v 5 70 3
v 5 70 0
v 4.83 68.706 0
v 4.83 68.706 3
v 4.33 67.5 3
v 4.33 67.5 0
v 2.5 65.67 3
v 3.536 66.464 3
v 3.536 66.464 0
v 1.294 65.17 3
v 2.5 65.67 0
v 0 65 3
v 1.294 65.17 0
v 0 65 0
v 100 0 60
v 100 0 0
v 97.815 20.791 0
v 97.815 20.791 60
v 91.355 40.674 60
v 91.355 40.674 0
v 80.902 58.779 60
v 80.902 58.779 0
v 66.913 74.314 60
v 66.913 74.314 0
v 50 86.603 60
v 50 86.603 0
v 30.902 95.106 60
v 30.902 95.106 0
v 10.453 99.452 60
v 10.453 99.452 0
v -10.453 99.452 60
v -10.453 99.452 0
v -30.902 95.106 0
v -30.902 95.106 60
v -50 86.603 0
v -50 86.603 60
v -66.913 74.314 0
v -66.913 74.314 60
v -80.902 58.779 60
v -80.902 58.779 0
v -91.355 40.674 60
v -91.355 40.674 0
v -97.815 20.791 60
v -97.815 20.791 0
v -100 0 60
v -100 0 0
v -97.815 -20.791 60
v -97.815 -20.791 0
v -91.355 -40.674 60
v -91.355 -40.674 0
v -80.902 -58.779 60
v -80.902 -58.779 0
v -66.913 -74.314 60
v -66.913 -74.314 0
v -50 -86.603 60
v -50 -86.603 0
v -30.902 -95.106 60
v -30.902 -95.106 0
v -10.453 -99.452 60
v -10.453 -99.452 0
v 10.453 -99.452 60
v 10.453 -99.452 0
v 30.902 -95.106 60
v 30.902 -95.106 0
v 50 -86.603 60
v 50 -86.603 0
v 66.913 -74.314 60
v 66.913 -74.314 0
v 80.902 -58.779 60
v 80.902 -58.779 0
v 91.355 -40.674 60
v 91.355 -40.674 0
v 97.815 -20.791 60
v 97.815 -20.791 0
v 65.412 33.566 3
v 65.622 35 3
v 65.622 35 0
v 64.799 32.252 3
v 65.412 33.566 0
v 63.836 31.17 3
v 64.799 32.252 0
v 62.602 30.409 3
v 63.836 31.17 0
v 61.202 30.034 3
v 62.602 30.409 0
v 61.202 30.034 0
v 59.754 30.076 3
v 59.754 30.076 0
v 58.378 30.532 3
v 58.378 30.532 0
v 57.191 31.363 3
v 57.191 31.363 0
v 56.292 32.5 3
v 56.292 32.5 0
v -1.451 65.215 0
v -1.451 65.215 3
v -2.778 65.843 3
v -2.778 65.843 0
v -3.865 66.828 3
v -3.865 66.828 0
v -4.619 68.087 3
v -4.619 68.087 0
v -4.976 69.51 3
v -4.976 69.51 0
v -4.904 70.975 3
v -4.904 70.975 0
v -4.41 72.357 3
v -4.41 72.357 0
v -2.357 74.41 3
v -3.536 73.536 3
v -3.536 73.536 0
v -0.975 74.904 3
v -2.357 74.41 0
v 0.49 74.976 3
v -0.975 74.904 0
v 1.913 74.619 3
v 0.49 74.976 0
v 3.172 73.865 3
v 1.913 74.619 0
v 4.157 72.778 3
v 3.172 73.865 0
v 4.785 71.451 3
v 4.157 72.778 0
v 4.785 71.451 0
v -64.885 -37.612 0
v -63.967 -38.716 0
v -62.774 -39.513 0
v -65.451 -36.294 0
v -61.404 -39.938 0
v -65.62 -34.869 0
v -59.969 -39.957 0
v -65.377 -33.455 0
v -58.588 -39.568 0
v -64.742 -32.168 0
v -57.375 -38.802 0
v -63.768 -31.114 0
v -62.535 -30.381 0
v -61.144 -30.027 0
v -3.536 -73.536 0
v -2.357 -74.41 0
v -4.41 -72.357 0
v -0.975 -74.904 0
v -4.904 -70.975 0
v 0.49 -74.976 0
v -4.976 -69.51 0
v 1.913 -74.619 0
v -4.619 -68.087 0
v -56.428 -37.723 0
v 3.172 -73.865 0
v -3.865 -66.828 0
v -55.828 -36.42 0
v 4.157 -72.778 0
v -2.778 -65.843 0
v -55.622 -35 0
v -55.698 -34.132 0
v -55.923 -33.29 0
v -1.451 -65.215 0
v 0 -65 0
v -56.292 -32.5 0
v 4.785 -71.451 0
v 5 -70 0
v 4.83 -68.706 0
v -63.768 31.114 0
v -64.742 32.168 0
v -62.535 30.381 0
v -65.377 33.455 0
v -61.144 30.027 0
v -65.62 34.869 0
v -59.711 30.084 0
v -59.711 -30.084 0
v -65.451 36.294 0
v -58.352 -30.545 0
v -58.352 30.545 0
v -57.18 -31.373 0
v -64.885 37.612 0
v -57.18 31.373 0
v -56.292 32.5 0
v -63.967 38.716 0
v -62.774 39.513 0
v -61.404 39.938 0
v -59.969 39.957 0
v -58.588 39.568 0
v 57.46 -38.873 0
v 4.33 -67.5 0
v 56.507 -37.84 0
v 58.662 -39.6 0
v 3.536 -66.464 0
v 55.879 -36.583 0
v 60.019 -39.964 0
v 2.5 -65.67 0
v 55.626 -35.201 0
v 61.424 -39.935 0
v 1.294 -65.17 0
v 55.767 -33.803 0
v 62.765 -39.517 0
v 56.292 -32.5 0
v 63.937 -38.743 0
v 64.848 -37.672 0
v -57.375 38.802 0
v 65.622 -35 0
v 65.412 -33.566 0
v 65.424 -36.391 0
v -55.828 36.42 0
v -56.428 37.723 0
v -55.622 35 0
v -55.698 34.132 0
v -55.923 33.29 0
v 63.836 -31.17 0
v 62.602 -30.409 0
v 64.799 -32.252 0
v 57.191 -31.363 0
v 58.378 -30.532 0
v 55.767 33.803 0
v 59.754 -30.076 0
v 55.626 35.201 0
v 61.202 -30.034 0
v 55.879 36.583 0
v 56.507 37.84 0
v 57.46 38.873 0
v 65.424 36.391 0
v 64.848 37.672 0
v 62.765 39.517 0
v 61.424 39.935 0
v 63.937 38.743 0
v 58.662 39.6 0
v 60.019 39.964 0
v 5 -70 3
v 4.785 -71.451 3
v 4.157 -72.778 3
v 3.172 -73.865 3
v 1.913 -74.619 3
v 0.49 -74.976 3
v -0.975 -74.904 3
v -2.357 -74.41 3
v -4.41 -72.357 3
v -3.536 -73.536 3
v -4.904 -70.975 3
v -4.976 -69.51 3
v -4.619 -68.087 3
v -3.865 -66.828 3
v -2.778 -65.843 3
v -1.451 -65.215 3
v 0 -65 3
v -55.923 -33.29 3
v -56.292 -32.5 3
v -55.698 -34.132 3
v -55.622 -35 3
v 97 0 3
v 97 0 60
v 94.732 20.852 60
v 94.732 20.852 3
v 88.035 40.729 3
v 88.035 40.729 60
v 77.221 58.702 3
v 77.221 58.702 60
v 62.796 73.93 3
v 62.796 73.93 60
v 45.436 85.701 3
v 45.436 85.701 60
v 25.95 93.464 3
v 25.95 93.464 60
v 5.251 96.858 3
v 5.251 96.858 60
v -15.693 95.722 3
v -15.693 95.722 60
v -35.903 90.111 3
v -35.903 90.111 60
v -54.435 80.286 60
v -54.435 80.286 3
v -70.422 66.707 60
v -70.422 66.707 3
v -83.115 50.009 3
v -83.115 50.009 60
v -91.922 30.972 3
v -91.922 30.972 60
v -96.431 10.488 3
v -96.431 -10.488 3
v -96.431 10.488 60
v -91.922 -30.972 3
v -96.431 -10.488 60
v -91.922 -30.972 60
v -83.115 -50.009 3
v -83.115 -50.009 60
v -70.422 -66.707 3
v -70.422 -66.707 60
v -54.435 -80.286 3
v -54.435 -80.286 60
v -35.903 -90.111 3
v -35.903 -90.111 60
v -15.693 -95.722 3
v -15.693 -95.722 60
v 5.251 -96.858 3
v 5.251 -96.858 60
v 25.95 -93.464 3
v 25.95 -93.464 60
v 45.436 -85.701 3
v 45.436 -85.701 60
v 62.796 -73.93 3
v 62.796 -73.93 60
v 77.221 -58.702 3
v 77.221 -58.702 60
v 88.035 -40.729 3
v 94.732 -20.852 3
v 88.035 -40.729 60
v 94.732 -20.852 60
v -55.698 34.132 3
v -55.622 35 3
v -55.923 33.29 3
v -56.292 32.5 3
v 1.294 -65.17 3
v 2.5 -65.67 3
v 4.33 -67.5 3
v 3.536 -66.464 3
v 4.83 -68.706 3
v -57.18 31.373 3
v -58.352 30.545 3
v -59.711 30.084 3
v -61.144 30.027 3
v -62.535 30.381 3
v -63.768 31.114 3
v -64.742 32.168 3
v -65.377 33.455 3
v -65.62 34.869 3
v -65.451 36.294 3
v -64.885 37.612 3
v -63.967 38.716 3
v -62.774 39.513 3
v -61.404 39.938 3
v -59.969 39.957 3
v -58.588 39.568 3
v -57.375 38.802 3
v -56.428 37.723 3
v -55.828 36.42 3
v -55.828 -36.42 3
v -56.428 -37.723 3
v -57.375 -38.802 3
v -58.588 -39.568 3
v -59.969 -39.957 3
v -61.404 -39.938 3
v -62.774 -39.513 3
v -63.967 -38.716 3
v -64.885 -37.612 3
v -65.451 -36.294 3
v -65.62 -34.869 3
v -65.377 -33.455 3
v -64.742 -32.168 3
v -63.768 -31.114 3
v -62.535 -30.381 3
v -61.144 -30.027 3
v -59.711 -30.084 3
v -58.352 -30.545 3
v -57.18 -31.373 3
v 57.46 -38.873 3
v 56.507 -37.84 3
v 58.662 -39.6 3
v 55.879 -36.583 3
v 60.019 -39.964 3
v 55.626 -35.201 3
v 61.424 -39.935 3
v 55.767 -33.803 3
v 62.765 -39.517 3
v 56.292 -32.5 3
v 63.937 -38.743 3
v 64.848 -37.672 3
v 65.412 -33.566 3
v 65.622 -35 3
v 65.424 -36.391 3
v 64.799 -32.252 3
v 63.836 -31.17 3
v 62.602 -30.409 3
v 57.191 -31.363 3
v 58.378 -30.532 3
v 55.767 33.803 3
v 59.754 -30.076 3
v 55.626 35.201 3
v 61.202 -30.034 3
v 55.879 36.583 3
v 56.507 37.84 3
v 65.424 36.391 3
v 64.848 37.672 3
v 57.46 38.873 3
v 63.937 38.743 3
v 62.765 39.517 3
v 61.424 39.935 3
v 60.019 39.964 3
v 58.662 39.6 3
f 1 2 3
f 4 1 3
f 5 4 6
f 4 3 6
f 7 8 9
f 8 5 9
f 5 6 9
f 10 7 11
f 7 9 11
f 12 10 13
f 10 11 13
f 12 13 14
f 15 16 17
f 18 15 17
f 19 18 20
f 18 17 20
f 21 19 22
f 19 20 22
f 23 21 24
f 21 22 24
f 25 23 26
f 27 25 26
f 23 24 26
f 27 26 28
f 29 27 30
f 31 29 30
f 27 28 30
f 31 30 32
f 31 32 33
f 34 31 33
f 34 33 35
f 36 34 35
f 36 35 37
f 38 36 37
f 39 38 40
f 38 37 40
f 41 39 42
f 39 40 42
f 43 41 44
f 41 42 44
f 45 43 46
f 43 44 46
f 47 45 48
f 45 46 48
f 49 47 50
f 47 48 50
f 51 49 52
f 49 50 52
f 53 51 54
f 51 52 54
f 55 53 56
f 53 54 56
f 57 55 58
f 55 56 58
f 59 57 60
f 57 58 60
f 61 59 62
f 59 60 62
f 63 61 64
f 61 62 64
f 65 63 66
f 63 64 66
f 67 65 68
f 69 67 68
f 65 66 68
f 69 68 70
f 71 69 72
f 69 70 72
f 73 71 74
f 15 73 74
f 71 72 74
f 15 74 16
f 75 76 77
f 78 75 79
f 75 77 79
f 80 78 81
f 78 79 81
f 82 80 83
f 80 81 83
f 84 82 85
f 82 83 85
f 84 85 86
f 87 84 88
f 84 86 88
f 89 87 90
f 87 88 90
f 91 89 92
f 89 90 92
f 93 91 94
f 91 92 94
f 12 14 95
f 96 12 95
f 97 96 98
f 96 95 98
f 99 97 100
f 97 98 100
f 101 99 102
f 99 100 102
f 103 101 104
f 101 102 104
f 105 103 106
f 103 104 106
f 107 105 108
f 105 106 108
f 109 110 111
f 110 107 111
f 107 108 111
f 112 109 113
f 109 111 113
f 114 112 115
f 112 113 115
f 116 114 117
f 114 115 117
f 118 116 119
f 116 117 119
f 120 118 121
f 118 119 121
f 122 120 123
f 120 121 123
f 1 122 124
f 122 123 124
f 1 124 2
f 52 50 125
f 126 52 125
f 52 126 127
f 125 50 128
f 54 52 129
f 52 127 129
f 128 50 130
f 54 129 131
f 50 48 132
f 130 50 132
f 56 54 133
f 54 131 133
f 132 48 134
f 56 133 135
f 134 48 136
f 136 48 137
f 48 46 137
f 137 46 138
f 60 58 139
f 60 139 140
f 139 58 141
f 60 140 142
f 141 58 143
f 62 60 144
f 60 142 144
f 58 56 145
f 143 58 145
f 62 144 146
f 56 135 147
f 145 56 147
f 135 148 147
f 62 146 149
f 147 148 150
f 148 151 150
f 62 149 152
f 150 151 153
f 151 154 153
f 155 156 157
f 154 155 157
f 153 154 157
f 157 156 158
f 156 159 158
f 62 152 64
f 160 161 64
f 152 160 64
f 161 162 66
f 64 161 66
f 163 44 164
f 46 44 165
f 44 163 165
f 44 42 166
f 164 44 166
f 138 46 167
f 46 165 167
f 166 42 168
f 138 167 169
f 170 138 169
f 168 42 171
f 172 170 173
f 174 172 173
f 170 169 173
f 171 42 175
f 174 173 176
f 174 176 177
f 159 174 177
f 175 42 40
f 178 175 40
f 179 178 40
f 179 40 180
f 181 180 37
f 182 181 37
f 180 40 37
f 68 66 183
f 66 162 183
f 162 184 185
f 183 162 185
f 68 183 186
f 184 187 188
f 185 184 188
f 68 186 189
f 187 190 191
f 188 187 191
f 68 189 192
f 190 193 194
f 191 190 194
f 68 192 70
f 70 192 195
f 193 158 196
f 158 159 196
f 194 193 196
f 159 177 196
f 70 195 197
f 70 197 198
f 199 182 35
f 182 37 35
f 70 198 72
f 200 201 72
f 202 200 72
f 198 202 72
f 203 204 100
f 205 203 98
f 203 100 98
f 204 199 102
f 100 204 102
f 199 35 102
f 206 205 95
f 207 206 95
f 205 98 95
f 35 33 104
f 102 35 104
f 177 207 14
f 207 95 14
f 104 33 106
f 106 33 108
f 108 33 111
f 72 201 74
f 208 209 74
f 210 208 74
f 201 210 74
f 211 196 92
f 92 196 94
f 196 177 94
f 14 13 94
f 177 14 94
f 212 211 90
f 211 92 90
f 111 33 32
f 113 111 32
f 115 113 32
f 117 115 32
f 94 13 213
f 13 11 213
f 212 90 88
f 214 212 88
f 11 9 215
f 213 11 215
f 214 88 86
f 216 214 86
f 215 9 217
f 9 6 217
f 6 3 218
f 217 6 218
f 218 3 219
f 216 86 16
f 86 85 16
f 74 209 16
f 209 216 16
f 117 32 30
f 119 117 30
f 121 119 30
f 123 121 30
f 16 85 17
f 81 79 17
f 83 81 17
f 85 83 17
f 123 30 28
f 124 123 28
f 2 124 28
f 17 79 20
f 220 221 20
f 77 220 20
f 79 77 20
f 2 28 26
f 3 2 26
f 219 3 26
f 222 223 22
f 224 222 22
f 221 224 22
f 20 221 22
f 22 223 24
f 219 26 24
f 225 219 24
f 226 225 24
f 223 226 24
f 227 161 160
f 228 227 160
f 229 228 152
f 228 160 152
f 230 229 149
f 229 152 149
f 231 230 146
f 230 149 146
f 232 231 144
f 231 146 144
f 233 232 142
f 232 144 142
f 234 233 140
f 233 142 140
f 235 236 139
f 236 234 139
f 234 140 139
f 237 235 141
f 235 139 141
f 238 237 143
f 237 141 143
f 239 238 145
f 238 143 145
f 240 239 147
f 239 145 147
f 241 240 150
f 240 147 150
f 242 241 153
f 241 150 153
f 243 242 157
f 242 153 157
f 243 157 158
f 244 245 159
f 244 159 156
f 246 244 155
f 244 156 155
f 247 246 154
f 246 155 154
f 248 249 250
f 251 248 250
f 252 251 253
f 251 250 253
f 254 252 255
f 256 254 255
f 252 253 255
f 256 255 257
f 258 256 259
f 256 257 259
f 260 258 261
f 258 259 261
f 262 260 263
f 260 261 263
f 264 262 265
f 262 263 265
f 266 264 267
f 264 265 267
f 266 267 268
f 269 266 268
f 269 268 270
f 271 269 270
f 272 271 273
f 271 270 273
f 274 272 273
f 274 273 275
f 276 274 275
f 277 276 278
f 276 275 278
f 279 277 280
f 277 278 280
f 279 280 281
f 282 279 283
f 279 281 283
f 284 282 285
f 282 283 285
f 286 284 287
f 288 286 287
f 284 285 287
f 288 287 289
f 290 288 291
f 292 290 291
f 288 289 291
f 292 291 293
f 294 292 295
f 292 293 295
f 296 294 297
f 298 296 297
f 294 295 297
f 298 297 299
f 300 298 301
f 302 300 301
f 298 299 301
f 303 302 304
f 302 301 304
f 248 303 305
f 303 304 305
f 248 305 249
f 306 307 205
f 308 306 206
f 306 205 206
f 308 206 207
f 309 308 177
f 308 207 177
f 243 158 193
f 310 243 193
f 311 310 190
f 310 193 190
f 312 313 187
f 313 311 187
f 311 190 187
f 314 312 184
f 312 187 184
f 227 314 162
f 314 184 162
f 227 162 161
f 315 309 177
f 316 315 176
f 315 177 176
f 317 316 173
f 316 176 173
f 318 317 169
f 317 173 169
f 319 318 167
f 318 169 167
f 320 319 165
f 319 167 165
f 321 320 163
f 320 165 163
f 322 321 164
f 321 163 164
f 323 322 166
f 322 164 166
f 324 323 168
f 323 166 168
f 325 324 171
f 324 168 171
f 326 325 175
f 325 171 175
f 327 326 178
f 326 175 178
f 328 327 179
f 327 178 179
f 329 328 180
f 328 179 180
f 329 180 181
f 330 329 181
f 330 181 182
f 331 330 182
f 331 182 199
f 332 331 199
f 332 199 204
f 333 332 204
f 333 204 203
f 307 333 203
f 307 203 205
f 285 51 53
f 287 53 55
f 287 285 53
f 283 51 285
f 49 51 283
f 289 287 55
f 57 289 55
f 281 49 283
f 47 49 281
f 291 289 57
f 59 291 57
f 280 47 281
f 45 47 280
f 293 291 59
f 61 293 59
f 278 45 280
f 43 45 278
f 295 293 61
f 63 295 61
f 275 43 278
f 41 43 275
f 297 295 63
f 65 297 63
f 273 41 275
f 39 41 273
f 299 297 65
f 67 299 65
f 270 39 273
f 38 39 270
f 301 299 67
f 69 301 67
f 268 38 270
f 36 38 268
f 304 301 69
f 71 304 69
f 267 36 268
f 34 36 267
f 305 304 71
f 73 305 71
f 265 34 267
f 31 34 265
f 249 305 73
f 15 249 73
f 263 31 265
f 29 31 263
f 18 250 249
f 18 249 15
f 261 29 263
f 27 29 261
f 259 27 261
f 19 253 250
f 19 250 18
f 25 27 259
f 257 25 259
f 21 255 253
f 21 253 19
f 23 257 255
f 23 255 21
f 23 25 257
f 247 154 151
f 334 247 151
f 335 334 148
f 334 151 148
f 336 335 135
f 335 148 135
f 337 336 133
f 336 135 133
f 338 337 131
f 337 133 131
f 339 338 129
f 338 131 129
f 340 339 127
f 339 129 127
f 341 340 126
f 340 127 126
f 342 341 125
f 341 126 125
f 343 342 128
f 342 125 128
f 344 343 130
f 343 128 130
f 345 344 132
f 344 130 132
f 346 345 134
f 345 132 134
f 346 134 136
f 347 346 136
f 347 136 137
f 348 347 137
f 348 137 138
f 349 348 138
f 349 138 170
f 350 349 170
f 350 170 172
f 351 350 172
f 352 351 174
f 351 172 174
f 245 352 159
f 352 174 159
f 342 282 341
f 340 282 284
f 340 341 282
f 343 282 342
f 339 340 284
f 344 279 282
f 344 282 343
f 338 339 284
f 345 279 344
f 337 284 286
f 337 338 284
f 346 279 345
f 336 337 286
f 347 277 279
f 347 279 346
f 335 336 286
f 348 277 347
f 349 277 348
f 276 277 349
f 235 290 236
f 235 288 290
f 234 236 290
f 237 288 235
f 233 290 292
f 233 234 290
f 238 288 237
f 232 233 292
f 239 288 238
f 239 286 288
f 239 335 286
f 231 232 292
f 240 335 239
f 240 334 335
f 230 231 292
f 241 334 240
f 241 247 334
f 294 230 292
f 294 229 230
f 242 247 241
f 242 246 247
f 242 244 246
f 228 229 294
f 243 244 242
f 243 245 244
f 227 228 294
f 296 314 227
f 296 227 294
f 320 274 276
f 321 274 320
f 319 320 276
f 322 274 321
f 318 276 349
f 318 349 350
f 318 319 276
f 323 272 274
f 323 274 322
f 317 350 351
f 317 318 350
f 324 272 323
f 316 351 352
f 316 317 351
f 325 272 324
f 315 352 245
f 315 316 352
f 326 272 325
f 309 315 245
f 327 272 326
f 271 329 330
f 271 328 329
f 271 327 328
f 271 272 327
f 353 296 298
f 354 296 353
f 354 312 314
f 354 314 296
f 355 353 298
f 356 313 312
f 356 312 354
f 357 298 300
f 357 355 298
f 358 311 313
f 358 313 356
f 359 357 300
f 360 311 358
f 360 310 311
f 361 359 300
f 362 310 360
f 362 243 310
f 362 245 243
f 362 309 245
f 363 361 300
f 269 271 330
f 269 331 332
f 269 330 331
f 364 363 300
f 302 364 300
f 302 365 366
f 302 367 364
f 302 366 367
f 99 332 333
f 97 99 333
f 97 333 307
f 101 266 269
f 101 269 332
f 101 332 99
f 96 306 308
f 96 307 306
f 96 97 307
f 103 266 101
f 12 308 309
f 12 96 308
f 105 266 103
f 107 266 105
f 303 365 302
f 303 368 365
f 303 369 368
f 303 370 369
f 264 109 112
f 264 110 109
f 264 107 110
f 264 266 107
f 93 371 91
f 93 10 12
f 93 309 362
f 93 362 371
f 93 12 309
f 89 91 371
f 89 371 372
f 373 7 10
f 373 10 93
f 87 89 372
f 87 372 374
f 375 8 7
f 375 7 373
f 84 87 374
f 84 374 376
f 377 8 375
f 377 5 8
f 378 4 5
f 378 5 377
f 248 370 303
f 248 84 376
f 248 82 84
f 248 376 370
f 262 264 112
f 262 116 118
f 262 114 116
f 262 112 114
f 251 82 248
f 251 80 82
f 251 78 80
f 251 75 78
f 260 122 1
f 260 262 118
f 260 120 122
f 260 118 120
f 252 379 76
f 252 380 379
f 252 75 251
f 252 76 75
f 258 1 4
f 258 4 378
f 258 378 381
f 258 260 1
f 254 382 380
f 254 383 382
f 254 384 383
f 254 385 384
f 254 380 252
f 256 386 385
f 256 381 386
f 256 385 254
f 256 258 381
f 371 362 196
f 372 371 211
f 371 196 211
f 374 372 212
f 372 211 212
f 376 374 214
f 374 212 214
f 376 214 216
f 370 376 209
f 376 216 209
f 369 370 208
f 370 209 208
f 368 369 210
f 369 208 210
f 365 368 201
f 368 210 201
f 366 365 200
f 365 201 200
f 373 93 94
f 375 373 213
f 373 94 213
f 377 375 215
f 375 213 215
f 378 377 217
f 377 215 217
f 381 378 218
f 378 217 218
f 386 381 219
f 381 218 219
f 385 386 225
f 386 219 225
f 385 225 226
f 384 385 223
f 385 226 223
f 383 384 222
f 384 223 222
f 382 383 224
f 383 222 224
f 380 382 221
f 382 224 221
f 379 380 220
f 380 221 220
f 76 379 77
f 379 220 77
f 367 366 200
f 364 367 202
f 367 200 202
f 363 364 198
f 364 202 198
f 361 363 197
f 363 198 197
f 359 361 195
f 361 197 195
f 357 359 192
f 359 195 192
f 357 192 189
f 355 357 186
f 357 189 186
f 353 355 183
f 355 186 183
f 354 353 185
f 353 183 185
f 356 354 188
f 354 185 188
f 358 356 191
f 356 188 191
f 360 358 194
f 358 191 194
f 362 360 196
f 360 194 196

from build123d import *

# Parameters (mm, degrees)
F0_R     = 100
F1_DEPTH = 60
F2_R     = 97
F2_R_2   = 5
F3_DEPTH = 57


with BuildPart() as f1:
    # F0 (on Top) → F1 (new body)
    with BuildSketch(Plane.XY):
        Circle(F0_R)
        with BuildLine():
            ThreePointArc((-55.621778, -35), (-65.451407, -36.294095), (-56.291651, -32.5))
            ThreePointArc((-56.291651, -32.5), (-55.792149, -33.705905), (-55.621778, -35))
        make_face(mode=Mode.SUBTRACT)
        with BuildLine():
            ThreePointArc((5, -70), (-3.535534, -73.535534), (0, -65))
            ThreePointArc((0, -65), (3.535534, -66.464466), (5, -70))
        make_face(mode=Mode.SUBTRACT)
        with BuildLine():
            ThreePointArc((65.621778, -35), (59.327683, -39.829629), (56.291651, -32.5))
            ThreePointArc((56.291651, -32.5), (61.915873, -30.170371), (65.621778, -35))
        make_face(mode=Mode.SUBTRACT)
        with BuildLine():
            ThreePointArc((-55.621778, 35), (-55.792149, 33.705905), (-56.291651, 32.5))
            ThreePointArc((-56.291651, 32.5), (-65.451407, 36.294095), (-55.621778, 35))
        make_face(mode=Mode.SUBTRACT)
        with BuildLine():
            ThreePointArc((65.621778, 35), (61.915873, 30.170371), (56.291651, 32.5))
            ThreePointArc((56.291651, 32.5), (59.327683, 39.829629), (65.621778, 35))
        make_face(mode=Mode.SUBTRACT)
        with BuildLine():
            ThreePointArc((5, 70), (3.535534, 66.464466), (0, 65))
            ThreePointArc((0, 65), (-3.535534, 73.535534), (5, 70))
        make_face(mode=Mode.SUBTRACT)
    extrude(amount=F1_DEPTH)

    # F2 (on face) → F3 (cut)
    with BuildSketch(Plane.XY.offset(60)):
        Circle(F2_R)
        Circle(F2_R)
        with Locations((-60.621778, -35)):
            Circle(F2_R_2, mode=Mode.SUBTRACT)
        with Locations((0, -70)):
            Circle(F2_R_2, mode=Mode.SUBTRACT)
        with Locations((60.621778, -35)):
            Circle(F2_R_2, mode=Mode.SUBTRACT)
        with Locations((-60.621778, 35)):
            Circle(F2_R_2, mode=Mode.SUBTRACT)
        with Locations((60.621778, 35)):
            Circle(F2_R_2, mode=Mode.SUBTRACT)
        with Locations((0, 70)):
            Circle(F2_R_2, mode=Mode.SUBTRACT)
    extrude(amount=-F3_DEPTH, mode=Mode.SUBTRACT)


solid = f1.part
